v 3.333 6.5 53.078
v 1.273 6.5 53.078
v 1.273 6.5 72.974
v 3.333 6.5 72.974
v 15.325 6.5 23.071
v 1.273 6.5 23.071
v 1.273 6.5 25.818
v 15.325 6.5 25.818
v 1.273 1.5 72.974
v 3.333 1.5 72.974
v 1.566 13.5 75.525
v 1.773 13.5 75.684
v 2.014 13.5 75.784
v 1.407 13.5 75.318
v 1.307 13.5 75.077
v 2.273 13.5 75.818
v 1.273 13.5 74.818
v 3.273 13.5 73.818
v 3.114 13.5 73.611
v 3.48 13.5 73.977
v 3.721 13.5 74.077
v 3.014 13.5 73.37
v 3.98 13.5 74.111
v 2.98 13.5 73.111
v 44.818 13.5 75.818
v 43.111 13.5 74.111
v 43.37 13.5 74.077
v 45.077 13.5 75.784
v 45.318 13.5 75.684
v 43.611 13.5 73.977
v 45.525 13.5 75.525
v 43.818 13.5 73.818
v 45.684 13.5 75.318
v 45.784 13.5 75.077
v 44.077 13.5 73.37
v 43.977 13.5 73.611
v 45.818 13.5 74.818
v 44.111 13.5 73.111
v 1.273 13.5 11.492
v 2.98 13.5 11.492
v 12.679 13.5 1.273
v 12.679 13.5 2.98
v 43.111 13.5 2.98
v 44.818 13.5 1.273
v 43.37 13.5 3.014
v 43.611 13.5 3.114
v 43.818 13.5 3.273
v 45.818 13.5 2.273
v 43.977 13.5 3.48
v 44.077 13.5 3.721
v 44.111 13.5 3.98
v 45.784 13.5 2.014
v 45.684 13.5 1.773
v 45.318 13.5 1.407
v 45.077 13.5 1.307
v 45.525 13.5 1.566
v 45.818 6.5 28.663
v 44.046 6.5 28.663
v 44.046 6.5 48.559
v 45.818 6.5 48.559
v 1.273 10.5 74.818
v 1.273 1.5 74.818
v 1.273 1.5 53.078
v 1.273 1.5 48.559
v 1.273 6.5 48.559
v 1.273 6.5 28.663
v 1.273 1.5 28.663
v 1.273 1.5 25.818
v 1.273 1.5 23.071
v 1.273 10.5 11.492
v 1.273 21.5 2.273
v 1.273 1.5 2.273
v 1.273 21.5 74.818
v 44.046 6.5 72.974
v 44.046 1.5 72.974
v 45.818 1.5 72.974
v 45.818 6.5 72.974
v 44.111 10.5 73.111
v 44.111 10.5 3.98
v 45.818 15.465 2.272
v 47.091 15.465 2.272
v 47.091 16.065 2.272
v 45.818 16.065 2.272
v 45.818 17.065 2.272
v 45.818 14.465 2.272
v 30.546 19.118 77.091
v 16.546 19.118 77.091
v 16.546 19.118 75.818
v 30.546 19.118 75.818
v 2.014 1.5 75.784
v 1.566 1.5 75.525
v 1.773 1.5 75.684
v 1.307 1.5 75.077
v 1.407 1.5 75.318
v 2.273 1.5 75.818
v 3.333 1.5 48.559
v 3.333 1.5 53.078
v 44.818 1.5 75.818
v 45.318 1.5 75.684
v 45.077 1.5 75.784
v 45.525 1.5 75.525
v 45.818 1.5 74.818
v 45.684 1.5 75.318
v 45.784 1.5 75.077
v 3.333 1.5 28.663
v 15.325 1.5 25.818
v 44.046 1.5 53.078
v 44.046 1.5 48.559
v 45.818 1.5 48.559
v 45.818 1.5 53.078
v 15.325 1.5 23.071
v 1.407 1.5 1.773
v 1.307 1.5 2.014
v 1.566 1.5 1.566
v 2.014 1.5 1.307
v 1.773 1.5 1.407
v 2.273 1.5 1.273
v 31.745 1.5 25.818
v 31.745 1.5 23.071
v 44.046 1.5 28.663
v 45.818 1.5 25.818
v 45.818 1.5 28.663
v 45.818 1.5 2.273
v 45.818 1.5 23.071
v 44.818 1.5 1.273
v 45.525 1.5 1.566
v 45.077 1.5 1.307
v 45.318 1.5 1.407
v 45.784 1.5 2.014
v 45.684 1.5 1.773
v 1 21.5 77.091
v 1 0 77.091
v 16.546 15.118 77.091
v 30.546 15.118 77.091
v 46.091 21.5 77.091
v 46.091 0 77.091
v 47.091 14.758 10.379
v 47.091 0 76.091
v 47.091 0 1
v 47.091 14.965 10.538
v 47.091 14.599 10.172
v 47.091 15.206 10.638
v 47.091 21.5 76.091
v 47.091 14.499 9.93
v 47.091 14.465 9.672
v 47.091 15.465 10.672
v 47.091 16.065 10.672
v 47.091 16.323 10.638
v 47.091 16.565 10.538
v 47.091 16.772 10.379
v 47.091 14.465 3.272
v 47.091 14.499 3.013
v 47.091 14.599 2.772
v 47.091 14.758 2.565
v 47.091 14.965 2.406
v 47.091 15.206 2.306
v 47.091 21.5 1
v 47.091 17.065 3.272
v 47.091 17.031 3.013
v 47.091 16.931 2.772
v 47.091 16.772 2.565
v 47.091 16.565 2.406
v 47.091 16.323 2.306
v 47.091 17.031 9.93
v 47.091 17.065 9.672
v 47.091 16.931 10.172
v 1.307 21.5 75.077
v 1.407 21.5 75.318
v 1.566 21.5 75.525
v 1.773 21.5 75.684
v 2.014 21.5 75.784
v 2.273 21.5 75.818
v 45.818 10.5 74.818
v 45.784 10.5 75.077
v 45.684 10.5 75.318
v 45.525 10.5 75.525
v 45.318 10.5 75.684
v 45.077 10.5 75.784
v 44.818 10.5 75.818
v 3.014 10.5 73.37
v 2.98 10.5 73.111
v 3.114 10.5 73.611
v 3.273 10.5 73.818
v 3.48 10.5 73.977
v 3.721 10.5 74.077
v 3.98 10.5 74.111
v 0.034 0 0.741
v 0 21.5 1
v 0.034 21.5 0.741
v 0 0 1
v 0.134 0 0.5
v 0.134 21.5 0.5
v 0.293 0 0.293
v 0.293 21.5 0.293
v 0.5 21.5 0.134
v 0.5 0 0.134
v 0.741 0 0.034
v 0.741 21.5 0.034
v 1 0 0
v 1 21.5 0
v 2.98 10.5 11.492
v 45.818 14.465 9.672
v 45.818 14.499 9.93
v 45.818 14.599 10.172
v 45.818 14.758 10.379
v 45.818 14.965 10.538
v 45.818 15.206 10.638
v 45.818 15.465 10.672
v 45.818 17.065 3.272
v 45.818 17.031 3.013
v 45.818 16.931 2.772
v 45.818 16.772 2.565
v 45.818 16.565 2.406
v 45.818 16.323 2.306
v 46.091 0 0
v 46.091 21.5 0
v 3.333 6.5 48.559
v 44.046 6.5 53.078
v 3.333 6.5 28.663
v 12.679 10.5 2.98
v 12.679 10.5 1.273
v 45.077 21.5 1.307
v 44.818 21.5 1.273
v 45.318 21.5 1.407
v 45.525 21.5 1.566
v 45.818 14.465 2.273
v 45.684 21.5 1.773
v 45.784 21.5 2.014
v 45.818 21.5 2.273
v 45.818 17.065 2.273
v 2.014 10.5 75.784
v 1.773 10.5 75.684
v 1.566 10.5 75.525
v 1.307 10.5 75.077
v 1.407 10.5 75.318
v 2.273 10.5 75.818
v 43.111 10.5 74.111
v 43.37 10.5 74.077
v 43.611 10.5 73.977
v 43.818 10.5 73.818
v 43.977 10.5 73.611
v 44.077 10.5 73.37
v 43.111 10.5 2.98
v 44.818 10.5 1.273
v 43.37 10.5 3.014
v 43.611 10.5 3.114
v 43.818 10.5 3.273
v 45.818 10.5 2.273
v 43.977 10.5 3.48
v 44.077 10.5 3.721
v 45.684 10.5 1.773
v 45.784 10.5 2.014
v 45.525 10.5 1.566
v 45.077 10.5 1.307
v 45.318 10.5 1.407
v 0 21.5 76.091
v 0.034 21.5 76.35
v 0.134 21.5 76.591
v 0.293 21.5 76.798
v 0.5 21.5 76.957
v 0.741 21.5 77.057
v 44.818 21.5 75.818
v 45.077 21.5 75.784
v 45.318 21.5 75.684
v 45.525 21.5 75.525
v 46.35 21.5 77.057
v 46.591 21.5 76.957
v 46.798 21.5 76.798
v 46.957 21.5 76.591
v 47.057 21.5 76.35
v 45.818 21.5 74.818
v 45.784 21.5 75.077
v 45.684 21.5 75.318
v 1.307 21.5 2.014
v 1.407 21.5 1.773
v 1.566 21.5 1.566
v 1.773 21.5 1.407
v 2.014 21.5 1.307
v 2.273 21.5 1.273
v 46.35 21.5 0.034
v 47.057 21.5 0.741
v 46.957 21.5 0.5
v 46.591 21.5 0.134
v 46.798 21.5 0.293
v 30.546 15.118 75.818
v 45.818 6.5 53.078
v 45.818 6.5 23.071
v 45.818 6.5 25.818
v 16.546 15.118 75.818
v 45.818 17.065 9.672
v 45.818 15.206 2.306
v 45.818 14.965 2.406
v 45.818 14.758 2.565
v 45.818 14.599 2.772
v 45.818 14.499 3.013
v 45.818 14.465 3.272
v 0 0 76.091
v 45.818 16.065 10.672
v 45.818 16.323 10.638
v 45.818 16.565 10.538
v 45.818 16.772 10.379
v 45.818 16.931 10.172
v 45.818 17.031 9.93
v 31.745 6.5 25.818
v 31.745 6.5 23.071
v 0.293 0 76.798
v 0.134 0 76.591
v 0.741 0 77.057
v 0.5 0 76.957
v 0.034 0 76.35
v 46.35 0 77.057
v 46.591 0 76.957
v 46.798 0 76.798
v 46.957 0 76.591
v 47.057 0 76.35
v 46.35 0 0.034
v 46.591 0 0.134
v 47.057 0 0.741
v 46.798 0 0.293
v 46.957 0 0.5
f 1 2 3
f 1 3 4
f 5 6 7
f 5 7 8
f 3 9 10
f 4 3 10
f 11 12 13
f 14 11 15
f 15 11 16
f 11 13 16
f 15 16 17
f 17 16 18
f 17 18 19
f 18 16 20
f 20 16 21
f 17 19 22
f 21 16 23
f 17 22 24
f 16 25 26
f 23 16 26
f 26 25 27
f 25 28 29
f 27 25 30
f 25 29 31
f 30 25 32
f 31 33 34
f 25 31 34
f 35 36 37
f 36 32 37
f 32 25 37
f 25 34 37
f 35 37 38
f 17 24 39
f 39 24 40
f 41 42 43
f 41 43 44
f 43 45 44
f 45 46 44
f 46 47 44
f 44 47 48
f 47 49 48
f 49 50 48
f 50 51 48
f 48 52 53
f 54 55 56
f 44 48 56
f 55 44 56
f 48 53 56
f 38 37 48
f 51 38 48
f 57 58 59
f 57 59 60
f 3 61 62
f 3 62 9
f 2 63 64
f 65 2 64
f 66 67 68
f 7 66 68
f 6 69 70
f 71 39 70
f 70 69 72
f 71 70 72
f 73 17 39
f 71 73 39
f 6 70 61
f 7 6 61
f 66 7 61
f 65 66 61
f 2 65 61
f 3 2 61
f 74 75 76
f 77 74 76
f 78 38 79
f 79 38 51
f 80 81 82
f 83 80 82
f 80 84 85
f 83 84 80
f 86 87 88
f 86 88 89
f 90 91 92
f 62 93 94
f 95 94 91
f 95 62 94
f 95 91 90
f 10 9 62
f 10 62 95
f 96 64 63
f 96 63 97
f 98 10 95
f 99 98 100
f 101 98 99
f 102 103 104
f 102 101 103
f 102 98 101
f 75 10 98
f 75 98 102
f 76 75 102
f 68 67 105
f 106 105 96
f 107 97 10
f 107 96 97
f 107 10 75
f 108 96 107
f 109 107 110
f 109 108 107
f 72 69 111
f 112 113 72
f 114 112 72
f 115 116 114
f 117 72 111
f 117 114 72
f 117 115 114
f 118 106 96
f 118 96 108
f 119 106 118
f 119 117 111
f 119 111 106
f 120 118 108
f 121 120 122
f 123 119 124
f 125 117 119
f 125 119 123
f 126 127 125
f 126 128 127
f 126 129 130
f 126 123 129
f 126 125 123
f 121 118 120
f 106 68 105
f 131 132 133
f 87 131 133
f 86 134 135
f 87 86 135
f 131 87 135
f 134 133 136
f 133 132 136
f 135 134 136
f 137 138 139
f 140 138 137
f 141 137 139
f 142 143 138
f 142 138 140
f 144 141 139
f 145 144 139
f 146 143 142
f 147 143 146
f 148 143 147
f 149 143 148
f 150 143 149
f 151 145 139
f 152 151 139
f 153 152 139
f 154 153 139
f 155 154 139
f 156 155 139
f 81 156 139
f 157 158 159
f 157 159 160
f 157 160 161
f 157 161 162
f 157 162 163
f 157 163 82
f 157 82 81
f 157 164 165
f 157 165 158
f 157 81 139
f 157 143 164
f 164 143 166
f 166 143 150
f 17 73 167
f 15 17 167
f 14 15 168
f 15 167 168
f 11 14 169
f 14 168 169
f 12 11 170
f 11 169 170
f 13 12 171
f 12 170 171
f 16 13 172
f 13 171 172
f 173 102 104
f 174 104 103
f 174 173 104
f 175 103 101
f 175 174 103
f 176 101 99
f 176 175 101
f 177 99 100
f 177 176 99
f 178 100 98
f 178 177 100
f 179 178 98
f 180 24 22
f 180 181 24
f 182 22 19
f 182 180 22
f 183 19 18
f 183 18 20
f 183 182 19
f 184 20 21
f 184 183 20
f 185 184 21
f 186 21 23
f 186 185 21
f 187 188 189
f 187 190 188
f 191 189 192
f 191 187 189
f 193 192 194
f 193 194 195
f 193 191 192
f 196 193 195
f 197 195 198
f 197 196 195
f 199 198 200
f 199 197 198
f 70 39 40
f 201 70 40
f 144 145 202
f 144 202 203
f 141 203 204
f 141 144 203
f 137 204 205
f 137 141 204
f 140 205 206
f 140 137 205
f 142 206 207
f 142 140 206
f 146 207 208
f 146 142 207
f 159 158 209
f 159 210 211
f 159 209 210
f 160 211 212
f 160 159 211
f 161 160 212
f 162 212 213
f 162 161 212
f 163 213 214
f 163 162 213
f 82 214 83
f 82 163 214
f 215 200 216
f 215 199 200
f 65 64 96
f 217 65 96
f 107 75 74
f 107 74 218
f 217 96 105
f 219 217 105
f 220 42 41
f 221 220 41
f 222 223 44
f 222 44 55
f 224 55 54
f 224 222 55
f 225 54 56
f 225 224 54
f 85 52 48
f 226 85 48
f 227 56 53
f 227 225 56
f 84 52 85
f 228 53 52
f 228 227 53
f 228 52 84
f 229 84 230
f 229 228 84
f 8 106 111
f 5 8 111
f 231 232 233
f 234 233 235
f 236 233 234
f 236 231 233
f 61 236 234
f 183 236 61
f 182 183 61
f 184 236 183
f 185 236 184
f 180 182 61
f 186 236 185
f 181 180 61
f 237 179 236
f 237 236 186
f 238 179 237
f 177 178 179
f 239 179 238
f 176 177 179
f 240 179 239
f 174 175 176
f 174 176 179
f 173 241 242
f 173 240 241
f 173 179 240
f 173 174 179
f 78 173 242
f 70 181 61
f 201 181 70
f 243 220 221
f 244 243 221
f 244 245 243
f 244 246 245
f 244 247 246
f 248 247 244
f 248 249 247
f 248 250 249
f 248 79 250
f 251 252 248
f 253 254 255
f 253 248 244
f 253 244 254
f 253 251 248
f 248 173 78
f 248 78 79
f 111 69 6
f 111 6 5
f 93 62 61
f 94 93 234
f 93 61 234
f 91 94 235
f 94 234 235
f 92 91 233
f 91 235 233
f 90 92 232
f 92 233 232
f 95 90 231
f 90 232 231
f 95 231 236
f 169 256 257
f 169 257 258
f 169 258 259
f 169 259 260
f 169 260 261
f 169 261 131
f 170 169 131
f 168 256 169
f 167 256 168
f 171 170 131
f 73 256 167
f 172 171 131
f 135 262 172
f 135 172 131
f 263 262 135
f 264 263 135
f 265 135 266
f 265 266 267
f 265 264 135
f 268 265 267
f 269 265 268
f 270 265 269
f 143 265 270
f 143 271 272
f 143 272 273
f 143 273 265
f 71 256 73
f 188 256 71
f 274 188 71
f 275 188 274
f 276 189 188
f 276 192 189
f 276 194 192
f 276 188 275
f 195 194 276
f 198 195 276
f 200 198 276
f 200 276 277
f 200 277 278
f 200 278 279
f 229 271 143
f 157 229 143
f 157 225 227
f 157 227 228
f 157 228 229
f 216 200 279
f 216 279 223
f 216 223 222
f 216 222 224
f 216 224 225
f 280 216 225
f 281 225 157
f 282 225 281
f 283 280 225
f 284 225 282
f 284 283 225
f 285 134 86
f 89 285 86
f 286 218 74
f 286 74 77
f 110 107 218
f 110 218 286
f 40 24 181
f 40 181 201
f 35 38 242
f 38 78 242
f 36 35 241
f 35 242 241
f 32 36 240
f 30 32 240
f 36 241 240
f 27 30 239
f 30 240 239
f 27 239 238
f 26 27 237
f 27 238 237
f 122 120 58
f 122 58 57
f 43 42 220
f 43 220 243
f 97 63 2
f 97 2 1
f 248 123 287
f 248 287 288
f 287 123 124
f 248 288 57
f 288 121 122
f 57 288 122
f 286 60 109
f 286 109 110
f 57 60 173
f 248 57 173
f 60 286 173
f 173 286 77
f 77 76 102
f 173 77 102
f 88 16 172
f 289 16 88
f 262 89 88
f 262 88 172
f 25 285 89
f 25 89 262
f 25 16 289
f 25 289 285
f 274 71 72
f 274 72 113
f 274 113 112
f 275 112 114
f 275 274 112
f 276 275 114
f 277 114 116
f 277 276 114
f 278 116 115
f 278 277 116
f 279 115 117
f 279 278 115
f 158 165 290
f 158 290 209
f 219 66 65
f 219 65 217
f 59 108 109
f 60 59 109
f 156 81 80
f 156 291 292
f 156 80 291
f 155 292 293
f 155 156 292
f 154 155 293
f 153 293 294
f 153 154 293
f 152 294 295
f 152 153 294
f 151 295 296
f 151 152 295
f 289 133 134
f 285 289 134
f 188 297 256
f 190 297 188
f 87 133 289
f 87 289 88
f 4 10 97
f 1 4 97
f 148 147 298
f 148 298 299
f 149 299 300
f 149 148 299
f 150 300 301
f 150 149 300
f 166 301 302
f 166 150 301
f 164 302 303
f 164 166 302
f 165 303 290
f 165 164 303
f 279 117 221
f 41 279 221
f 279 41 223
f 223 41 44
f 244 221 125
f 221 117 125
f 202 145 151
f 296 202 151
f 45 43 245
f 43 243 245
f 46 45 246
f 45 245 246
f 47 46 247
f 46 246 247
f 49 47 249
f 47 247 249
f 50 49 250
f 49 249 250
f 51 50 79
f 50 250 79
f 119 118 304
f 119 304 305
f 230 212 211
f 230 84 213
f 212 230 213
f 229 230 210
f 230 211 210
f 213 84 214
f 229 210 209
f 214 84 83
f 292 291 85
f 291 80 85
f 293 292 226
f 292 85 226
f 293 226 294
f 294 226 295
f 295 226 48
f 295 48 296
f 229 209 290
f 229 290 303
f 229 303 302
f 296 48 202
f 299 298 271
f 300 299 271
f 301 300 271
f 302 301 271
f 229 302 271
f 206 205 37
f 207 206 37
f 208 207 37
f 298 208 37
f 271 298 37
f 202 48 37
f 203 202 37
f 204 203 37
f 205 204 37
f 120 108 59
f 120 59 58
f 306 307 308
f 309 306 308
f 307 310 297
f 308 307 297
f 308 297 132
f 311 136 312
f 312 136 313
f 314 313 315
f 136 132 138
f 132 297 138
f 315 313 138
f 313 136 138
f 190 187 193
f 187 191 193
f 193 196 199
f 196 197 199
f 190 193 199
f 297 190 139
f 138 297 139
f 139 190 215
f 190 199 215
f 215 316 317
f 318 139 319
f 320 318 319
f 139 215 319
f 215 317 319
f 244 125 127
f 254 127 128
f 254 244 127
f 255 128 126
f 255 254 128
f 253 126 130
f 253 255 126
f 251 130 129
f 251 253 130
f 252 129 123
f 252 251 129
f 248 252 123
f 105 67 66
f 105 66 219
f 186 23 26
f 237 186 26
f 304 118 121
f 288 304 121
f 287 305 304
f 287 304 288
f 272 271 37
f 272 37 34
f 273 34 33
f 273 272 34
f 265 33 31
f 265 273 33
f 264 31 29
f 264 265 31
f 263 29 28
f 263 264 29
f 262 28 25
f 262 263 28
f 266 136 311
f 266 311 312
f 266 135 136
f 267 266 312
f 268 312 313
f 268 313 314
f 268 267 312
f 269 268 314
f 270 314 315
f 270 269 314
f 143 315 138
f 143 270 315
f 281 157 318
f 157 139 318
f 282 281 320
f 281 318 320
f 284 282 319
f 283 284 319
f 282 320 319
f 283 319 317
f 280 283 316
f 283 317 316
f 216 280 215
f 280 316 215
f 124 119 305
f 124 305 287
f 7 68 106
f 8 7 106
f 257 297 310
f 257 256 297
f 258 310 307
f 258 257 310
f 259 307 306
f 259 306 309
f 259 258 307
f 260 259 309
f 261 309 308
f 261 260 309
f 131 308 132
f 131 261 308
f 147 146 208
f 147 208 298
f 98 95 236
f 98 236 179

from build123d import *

# Parameters (mm, degrees)
SKETCH1_W           = 47.09116882
SKETCH1_H           = 77.09116882
BOSS_EXTRUDE1_DEPTH = 1.5
SKETCH2_W           = 47.09116882
SKETCH2_H           = 77.09116882
SKETCH2_W_2         = 44.545584412
SKETCH2_H_2         = 74.545584412
BOSS_EXTRUDE2_DEPTH = 20
FILLET4_R           = 1
SKETCH9_W           = 8.4
SKETCH9_H           = 2.6
CUT_EXTRUDE4_DEPTH  = 2
FILLET5_R           = 1
SKETCH10_W          = 2.5
SKETCH10_H          = 19.895622202
SKETCH10_W_2        = 15
SKETCH10_H_2        = 2.746977623
BOSS_EXTRUDE4_DEPTH = 5
SKETCH11_W          = 14
SKETCH11_H          = 4
CUT_EXTRUDE5_DEPTH  = 10
SKETCH12_W          = 75.09116882
SKETCH12_H          = 3
BOSS_EXTRUDE5_DEPTH = 46
SKETCH13_W          = 41.13137085
SKETCH13_H          = 71.13137085
CUT_EXTRUDE6_DEPTH  = 3
FILLET6_R           = 1
CUT_EXTRUDE8_DEPTH  = 3


with BuildPart() as part:
    # Sketch1 → Boss-Extrude1 (new body)
    with BuildSketch(Plane(origin=(0, 0, 0), x_dir=(1, 0, 0), z_dir=(0, 1, 0))):
        with Locations((23.54558441, -38.54558441)):
            Rectangle(SKETCH1_W, SKETCH1_H)
    extrude(amount=BOSS_EXTRUDE1_DEPTH)

    # Sketch2 → Boss-Extrude2 (add)
    with BuildSketch(Plane(origin=(0, 1.5, 0), x_dir=(1, 0, 0), z_dir=(0, 1, 0))):
        with Locations((23.54558441, -38.54558441)):
            Rectangle(SKETCH2_W, SKETCH2_H)
        with Locations((23.545584412, -38.545584412)):
            Rectangle(SKETCH2_W_2, SKETCH2_H_2, mode=Mode.SUBTRACT)
    extrude(amount=BOSS_EXTRUDE2_DEPTH)

    # Fillet4
    fillet4_edges = [part.edges().sort_by_distance(p)[0] for p in [
        (1.272792206, 11.5, 75.818376618),
        (45.818376618, 11.5, 75.818376618),
        (45.818376618, 11.5, 1.272792206),
        (1.272792206, 11.5, 1.272792206),
        (0, 10.75, 0),
        (47.09116882, 10.75, 0),
        (47.09116882, 10.75, 77.09116882),
        (0, 10.75, 77.09116882),
    ]]
    fillet(fillet4_edges, radius=FILLET4_R)

    # Sketch9 → Cut-Extrude4 (cut)
    with BuildSketch(Plane(origin=(47.09116882, 0, 0), x_dir=(0, 0, -1), z_dir=(1, 0, 0))):
        with Locations((-6.471655529, 15.764642051)):
            Rectangle(SKETCH9_W, SKETCH9_H)
    extrude(amount=-CUT_EXTRUDE4_DEPTH, mode=Mode.SUBTRACT)

    # Fillet5
    # the kernel refuses this fillet: 1 mm, written as the material it adds along each edge
    with BuildSketch(Plane(origin=(47.09116882, 17.064642051, 10.671655529), x_dir=(0, 0, -1), z_dir=(-1, 0, 0))) as fillet5_piece_1:
        with BuildLine():
            CenterArc((FILLET5_R, FILLET5_R), FILLET5_R, 180, 90)
            Line((0, FILLET5_R), (0, 0))
            Line((0, 0), (FILLET5_R, 0))
        make_face()
    extrude(amount=1.272792202)
    with BuildSketch(Plane(origin=(47.09116882, 14.464642051, 2.271655529), x_dir=(0, 0, 1), z_dir=(-1, 0, 0))) as fillet5_piece_2_section:
        with BuildLine():
            CenterArc((FILLET5_R, FILLET5_R), FILLET5_R, 180, 90)
            Line((0, FILLET5_R), (0, 0))
            Line((0, 0), (FILLET5_R, 0))
        make_face()
    fillet5_piece_2 = extrude(amount=3.772792848, mode=Mode.PRIVATE)
    fillet5_piece_2 = split(fillet5_piece_2, bisect_by=Plane(origin=(45.818376618, 14.688009946, 2.495023498), z_dir=(1, 0, 0)), keep=Keep.TOP, mode=Mode.PRIVATE)
    add(fillet5_piece_2)
    with BuildSketch(Plane(origin=(47.09116882, 17.064642051, 2.271655529), x_dir=(0, -1, 0), z_dir=(-1, 0, 0))) as fillet5_piece_3_section:
        with BuildLine():
            CenterArc((FILLET5_R, FILLET5_R), FILLET5_R, 180, 90)
            Line((0, FILLET5_R), (0, 0))
            Line((0, 0), (FILLET5_R, 0))
        make_face()
    fillet5_piece_3 = extrude(amount=3.772792848, mode=Mode.PRIVATE)
    fillet5_piece_3 = split(fillet5_piece_3, bisect_by=Plane(origin=(45.818376618, 16.841274155, 2.495023498), z_dir=(1, 0, 0)), keep=Keep.TOP, mode=Mode.PRIVATE)
    add(fillet5_piece_3)
    with BuildSketch(Plane(origin=(47.09116882, 14.464642051, 10.671655529), x_dir=(0, 0, -1), z_dir=(-1, 0, 0))) as fillet5_piece_4:
        with BuildLine():
            CenterArc((FILLET5_R, -FILLET5_R), FILLET5_R, 90, 90)
            Line((0, -FILLET5_R), (0, 0))
            Line((0, 0), (FILLET5_R, 0))
        make_face()
    extrude(amount=1.272792202)

    # Sketch10 → Boss-Extrude4 (add)
    with BuildSketch(Plane(origin=(0, 1.5, 0), x_dir=(1, 0, 0), z_dir=(0, 1, 0))):
        with Locations((2.082813384, -63.025844565)):
            Rectangle(SKETCH10_W, SKETCH10_H)
        with Locations((7.824900782, -24.444887807)):
            Rectangle(SKETCH10_W_2, SKETCH10_H_2)
        with Locations((39.244805213, -24.444887807)):
            Rectangle(SKETCH10_W_2, SKETCH10_H_2)
        with Locations((2.082813384, -38.610908672)):
            Rectangle(SKETCH10_W, SKETCH10_H)
        with Locations((45.295584412, -38.610908672)):
            Rectangle(SKETCH10_W, SKETCH10_H)
        with Locations((45.295584412, -63.025844565)):
            Rectangle(SKETCH10_W, SKETCH10_H)
    extrude(amount=BOSS_EXTRUDE4_DEPTH)

    # Sketch11 → Cut-Extrude5 (cut)
    with BuildSketch(Plane.XY.offset(77.09116882)):
        with Locations((23.545584412, 17.117945241)):
            Rectangle(SKETCH11_W, SKETCH11_H)
    extrude(amount=-CUT_EXTRUDE5_DEPTH, mode=Mode.SUBTRACT)

    # Sketch12 → Boss-Extrude5 (add)
    with BuildSketch(Plane(origin=(47.09116882, 0, 0), x_dir=(0, 0, -1), z_dir=(1, 0, 0))):
        with Locations((-38.54558441, 12)):
            Rectangle(SKETCH12_W, SKETCH12_H)
    extrude(amount=-BOSS_EXTRUDE5_DEPTH)

    # Sketch13 → Cut-Extrude6 (cut)
    with BuildSketch(Plane(origin=(0, 13.5, 0), x_dir=(1, 0, 0), z_dir=(0, 1, 0))):
        with Locations((23.545584412, -38.545584412)):
            Rectangle(SKETCH13_W, SKETCH13_H)
    extrude(amount=-CUT_EXTRUDE6_DEPTH, mode=Mode.SUBTRACT)

    # Fillet6
    fillet6_edges = [part.edges().sort_by_distance(p)[0] for p in [
        (44.111269837, 12, 74.111269837),
        (2.979898987, 12, 74.111269837),
        (2.979898987, 12, 2.979898987),
        (44.111269837, 12, 2.979898987),
    ]]
    fillet(fillet6_edges, radius=FILLET6_R)

    # Sketch14 → Cut-Extrude8 (cut)
    with BuildSketch(Plane(origin=(0, 13.5, 0), x_dir=(1, 0, 0), z_dir=(0, 1, 0))):
        with BuildLine():
            Line((1.272792206, -11.492184631), (12.679197534, -11.492184631))
            Line((12.679197534, -11.492184631), (12.679197534, -1.272792206))
            Line((12.679197534, -1.272792206), (2.272792206, -1.272792206))
            ThreePointArc((2.272792206, -1.272792206), (1.565685425, -1.565685425), (1.272792206, -2.272792206))
            Line((1.272792206, -2.272792206), (1.272792206, -11.492184631))
        make_face()
    extrude(amount=-CUT_EXTRUDE8_DEPTH, mode=Mode.SUBTRACT)


solid = part.part
